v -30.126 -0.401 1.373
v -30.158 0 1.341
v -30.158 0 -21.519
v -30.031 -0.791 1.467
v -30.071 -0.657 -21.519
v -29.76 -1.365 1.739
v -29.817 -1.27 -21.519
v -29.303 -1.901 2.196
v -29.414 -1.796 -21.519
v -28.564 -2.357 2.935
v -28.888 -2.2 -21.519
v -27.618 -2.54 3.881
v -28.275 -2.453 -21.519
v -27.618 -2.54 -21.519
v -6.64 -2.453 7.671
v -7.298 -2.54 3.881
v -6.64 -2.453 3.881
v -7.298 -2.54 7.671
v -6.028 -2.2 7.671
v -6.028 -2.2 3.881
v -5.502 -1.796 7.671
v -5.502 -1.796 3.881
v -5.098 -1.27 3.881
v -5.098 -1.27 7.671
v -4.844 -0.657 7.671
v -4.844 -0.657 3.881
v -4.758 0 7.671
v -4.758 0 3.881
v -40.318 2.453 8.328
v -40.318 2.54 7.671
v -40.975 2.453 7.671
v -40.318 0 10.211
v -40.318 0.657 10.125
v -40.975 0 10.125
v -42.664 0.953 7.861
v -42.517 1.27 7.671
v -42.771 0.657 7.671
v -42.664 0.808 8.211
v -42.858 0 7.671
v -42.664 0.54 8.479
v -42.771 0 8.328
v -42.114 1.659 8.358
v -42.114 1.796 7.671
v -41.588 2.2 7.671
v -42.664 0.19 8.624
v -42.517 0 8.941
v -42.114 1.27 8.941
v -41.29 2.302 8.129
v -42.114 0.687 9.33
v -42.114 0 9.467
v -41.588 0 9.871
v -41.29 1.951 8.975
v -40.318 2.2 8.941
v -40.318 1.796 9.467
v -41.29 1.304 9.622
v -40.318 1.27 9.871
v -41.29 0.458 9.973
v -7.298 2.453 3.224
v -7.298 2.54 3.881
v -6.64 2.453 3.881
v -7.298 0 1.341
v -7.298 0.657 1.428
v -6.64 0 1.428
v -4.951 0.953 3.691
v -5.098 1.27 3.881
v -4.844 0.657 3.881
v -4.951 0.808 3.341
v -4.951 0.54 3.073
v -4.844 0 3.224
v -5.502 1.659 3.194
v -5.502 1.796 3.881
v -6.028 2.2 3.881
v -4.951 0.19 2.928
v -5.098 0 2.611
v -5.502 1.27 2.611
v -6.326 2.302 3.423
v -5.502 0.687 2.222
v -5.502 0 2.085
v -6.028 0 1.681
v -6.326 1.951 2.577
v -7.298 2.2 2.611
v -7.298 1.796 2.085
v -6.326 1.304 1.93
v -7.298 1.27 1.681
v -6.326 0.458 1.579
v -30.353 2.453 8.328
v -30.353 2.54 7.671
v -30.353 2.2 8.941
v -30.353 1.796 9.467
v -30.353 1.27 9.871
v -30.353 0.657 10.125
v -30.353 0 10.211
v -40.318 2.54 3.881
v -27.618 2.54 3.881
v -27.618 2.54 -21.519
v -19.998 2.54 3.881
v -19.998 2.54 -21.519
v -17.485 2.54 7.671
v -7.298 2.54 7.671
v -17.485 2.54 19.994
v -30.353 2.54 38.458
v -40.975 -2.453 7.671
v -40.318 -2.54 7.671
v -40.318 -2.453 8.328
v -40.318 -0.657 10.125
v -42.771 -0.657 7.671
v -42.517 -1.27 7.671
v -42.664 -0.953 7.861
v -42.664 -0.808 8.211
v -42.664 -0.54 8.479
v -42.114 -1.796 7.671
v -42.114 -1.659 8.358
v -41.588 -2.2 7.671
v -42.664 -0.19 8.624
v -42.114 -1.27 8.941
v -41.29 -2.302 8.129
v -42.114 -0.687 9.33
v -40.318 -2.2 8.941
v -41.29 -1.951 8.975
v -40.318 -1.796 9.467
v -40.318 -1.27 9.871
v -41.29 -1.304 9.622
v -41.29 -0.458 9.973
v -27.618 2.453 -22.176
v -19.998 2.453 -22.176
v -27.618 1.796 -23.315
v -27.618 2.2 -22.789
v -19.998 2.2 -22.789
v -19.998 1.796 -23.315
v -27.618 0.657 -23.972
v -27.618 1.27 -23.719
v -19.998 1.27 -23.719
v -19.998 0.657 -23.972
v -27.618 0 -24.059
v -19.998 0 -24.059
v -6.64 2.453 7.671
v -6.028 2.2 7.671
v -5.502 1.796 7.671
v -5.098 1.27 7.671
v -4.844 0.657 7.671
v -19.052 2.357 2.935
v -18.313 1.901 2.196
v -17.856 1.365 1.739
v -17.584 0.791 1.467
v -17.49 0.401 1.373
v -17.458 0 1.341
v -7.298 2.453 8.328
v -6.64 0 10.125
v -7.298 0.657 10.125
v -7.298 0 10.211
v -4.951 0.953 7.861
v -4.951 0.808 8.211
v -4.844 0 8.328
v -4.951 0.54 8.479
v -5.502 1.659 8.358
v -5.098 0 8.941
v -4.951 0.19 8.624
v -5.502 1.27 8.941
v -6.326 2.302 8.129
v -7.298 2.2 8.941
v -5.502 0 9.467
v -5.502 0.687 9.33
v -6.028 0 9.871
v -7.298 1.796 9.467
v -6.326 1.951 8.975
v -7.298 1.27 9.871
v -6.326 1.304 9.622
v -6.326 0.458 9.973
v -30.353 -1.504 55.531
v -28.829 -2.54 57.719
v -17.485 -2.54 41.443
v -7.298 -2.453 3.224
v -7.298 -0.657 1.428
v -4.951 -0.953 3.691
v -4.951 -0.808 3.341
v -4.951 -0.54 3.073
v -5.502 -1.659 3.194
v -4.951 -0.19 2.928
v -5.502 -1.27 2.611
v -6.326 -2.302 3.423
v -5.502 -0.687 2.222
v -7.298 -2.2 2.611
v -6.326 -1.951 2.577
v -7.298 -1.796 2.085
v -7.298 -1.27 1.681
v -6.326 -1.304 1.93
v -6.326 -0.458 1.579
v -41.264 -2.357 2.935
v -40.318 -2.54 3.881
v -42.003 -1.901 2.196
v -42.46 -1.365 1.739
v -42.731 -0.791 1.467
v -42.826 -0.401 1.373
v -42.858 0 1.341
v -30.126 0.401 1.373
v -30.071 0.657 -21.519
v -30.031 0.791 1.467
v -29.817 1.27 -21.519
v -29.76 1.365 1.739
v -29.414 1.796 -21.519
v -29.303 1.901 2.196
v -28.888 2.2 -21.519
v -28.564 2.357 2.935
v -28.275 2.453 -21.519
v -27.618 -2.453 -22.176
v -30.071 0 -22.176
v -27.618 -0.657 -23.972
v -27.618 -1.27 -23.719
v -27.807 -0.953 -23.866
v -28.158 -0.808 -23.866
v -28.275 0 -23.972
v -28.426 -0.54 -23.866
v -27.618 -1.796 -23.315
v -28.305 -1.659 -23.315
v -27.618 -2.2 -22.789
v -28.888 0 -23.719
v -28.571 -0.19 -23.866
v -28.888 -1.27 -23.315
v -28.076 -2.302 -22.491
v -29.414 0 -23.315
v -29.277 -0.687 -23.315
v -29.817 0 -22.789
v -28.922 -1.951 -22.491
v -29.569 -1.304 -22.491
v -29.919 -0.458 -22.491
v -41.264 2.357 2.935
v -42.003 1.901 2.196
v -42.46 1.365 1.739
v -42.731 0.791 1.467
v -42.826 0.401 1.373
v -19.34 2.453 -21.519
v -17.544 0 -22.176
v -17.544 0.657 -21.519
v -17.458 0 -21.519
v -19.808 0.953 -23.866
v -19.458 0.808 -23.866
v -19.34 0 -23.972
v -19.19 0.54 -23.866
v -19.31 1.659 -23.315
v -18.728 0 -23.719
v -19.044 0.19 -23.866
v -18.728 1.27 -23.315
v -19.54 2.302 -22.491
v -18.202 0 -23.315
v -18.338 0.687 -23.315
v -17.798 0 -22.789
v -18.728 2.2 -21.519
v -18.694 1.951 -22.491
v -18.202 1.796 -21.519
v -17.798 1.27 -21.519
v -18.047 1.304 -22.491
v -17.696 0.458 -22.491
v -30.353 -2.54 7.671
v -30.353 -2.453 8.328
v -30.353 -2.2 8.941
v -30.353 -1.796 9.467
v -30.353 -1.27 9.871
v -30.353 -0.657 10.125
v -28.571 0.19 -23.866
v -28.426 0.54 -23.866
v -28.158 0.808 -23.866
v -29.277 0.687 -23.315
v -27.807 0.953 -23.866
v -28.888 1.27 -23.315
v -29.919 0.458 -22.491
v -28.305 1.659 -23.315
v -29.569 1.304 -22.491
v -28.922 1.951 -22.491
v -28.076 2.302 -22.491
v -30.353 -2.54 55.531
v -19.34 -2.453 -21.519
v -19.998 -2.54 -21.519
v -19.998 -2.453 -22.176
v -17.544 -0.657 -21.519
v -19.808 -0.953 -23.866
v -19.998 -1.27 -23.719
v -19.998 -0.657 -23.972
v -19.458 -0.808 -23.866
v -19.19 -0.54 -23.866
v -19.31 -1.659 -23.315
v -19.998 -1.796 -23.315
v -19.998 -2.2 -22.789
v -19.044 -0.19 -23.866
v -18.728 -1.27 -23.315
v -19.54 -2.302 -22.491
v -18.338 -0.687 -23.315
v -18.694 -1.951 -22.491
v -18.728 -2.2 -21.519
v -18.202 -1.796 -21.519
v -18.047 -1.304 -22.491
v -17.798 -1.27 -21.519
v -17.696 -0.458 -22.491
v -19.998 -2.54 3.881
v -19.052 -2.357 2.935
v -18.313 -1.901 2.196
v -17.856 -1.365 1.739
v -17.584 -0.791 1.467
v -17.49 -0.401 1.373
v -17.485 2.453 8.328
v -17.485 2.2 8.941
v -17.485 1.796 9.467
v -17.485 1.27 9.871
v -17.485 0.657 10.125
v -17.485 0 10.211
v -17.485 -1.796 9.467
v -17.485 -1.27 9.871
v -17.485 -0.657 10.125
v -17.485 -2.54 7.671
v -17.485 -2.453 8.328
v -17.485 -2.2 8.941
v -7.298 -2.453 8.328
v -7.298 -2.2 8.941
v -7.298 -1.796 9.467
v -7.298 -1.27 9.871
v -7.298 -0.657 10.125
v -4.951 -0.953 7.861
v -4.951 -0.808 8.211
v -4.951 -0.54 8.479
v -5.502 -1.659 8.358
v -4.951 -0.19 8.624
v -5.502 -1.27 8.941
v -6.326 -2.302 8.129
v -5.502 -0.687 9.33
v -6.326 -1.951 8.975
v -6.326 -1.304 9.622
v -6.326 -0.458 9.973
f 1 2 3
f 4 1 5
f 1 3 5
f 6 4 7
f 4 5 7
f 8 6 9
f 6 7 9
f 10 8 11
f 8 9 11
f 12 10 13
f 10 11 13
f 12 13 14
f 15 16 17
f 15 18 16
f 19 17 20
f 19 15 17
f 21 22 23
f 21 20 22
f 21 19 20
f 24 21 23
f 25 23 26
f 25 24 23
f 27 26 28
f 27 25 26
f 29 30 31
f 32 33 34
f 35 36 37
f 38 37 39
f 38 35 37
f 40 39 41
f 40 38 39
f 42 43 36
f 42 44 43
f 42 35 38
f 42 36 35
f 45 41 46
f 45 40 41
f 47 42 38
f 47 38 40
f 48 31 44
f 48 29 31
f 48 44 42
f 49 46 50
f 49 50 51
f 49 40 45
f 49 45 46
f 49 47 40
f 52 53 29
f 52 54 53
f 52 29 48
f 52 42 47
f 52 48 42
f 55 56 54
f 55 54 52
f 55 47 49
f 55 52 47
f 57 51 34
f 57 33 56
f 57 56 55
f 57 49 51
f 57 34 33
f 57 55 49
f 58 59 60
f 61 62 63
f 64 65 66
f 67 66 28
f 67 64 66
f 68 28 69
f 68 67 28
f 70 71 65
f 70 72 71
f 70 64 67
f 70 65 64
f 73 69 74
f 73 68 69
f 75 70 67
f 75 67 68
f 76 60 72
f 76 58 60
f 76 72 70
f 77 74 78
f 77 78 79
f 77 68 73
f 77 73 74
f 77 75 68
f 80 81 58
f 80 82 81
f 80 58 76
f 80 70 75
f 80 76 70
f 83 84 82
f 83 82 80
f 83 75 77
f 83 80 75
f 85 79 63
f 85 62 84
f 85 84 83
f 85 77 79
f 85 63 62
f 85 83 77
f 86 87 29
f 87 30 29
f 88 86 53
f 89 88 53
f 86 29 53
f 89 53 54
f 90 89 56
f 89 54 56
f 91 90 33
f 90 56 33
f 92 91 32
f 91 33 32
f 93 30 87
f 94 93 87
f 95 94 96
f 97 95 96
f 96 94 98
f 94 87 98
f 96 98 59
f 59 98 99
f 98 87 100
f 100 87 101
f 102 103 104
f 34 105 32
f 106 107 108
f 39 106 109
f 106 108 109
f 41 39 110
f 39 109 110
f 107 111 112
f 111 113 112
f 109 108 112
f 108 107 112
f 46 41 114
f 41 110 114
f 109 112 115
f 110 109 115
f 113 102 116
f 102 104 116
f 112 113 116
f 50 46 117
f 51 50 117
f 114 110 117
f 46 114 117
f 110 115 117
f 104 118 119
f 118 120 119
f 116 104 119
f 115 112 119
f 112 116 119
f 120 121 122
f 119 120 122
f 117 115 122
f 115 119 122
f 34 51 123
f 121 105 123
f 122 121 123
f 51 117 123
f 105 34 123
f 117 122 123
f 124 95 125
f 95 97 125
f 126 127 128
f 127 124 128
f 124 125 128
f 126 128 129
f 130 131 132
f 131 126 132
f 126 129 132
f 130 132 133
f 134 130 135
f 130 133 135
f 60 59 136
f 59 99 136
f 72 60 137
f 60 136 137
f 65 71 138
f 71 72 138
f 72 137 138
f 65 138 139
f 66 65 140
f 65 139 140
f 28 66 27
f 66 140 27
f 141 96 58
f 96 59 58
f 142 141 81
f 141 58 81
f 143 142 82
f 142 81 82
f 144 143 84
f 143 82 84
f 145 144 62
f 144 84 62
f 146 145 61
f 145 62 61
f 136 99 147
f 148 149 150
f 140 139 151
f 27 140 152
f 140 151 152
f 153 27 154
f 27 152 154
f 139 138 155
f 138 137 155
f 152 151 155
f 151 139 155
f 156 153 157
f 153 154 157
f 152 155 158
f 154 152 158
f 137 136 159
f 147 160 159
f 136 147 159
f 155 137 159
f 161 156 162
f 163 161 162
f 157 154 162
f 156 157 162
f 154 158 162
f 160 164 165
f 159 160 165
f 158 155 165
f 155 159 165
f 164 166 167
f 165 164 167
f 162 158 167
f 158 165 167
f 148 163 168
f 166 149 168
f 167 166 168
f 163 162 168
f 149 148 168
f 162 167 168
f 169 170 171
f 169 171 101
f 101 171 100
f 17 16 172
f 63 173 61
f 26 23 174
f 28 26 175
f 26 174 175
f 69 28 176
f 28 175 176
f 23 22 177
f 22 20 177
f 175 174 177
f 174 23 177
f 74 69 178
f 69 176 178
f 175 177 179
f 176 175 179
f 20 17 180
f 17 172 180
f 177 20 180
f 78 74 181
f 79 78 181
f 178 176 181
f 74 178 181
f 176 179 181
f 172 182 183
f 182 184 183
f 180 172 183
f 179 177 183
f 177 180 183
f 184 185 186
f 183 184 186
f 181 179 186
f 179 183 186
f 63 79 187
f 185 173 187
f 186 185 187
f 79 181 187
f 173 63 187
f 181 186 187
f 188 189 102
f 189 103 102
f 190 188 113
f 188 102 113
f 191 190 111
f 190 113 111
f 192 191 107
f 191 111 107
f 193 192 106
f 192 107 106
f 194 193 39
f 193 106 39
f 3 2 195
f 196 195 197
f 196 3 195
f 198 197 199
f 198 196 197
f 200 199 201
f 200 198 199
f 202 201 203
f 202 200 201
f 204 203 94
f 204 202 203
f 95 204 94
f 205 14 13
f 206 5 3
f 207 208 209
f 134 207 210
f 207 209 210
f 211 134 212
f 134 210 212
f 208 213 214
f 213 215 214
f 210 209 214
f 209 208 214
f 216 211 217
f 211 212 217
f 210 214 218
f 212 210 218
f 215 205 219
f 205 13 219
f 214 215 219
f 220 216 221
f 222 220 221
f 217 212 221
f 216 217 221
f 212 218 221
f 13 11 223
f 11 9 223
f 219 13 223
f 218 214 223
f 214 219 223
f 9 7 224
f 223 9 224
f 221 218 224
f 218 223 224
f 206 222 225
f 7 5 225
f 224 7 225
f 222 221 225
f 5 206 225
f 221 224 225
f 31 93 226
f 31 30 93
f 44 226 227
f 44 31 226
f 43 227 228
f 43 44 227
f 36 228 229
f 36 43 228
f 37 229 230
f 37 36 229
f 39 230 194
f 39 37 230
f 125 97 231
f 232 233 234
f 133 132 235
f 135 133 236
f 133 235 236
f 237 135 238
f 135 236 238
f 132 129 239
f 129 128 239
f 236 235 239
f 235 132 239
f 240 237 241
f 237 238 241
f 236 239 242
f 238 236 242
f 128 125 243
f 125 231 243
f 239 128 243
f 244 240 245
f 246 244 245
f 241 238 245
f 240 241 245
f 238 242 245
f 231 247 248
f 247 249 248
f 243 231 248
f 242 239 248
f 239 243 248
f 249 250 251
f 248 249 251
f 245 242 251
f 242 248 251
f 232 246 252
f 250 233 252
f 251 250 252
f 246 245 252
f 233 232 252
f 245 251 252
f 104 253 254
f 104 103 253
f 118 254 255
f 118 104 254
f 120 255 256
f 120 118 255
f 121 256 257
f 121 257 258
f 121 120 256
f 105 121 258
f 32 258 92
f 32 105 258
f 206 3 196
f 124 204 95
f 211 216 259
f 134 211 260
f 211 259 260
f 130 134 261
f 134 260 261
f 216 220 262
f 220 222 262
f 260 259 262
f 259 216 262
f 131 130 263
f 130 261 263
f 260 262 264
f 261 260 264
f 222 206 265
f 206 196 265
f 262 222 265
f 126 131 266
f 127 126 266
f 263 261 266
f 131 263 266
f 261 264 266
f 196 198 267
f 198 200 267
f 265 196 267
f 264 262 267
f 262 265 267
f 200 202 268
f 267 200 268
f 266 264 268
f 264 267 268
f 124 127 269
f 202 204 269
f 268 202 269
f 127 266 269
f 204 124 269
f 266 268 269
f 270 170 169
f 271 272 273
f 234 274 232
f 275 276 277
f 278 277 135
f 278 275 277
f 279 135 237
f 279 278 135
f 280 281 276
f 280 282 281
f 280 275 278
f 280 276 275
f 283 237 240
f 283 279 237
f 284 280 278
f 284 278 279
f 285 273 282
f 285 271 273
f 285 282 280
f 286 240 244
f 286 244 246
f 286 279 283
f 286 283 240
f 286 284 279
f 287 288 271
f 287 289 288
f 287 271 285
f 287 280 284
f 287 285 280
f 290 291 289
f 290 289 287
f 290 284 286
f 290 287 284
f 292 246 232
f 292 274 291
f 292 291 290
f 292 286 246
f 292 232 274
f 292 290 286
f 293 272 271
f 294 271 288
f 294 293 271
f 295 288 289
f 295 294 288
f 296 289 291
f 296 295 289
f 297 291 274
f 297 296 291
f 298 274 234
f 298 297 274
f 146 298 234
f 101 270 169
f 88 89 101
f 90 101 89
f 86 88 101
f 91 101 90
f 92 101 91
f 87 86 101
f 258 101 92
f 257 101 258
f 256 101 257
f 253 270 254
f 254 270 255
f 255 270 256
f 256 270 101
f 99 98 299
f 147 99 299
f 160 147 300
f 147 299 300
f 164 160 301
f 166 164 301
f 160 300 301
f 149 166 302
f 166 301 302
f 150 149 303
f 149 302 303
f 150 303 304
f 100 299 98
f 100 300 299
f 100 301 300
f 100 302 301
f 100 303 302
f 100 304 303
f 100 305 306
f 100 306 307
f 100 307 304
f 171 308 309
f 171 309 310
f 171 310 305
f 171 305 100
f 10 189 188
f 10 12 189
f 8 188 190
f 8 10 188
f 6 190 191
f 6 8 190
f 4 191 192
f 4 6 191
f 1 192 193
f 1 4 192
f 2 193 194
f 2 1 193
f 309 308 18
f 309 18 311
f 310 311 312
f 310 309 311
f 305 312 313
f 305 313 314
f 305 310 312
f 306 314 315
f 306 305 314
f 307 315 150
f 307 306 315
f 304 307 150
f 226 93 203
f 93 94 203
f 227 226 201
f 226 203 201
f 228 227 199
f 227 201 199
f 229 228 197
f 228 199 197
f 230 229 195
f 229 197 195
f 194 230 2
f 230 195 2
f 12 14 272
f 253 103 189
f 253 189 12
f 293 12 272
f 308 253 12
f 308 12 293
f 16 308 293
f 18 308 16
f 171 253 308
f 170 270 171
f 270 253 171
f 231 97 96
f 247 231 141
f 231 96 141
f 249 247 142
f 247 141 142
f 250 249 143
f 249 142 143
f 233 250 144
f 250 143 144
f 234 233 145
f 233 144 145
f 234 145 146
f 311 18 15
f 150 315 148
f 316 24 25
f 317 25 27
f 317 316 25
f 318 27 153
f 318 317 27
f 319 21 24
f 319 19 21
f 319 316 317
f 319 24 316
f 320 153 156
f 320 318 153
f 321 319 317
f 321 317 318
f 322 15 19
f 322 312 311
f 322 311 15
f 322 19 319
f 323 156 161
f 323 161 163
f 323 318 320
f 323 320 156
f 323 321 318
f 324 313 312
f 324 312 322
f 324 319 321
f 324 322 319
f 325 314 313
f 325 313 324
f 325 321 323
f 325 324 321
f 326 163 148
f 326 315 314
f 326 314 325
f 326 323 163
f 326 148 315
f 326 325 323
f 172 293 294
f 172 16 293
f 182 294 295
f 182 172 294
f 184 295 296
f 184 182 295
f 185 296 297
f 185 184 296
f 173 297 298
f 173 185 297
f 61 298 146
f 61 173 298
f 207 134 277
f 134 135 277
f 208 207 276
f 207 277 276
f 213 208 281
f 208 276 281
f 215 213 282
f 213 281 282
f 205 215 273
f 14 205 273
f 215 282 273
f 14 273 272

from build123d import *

# Parameters (mm, degrees)
F0_W        = 12.7
F0_H        = 8.8700183392
F0_H_2      = 25.4
F2_DEPTH    = 2.54
F3_DEPTH    = 2.54
F4_R        = 2.53999
F5_T1_DEPTH = 76.5737284666
F6_T1_DEPTH = 62.0182579324


# Not quite as in the source:
# - a fillet or chamfer that OpenCascade refuses, or shapes differently, is made with other operations: its cross-section is extruded or revolved along the edge and cut away or added
# - a fillet or chamfer is up to 0.001 mm smaller than in the source, because OpenCascade refuses the exact size


with BuildPart() as f2:
    # F0 (on Front) → F2 (new body, symmetric)
    with BuildSketch(Plane.XZ):
        with Locations((-23.8077666163, 5.7760581046)):
            Rectangle(F0_W, F0_H)
        with Locations((-23.8077666163, -11.3589510649)):
            Rectangle(F0_W, F0_H_2)
        with Locations((-36.5077666163, 5.7760581046)):
            Rectangle(F0_W, F0_H)
        with Locations((-11.1077666163, 5.7760581046)):
            Rectangle(F0_W, F0_H)
    extrude(amount=F2_DEPTH, both=True)

    # F1 (on Front) → F3 (join, symmetric)
    with BuildSketch(Plane.XZ):
        Polygon((-30.3534455597, 10.2110672742), (-17.4847040325, 10.2110672742), (-17.4847040325, 55.5314160883), (-23.9190747961, 64.7633413825), (-30.3534455597, 55.5314160883), align=None)
    extrude(amount=F3_DEPTH, both=True)

    # F4 (radius 2.54 in the source; OpenCascade refuses exactly that, so slightly less here)
    f4_edges = [f2.edges().sort_by_distance(p)[0] for p in [
        (-11.107767, 2.54, 1.341049),
        (-11.107767, -2.54, 1.341049),
        (-11.121235, 2.54, 10.211067),
        (-11.121235, -2.54, 10.211067),
        (-4.757767, -2.54, 5.776058),
        (-4.757767, 2.54, 5.776058),
        (-4.757767, 0, 10.211067),
        (-4.757767, 0, 1.341049),
        (-36.605606, -2.54, 10.211067),
        (-36.605606, 2.54, 10.211067),
        (-36.507767, -2.54, 1.341049),
        (-36.507767, 2.54, 1.341049),
        (-42.857767, -2.54, 5.776058),
        (-42.857767, 2.54, 5.776058),
        (-42.857767, 0, 10.211067),
        (-17.457767, 2.54, -11.358951),
        (-17.457767, -2.54, -11.358951),
        (-30.157767, -2.54, -11.358951),
        (-30.157767, 2.54, -11.358951),
        (-23.807767, -2.54, -24.058951),
        (-30.157767, 0, -24.058951),
        (-23.807767, 2.54, -24.058951),
        (-17.457767, 0, -24.058951),
    ]]
    fillet(f4_edges, radius=F4_R)

    # F5: chamfer of 12.7 on 1 edges, made by hand

    # F5_s2 → F5_t1 (cut)
    with BuildSketch(Plane(origin=(-13.0912626788, 0, 18.7831201367), x_dir=(0, 1, 0), z_dir=(-0.5717925773, 0, 0.8203982256))):
        Polygon((2.54, -4.7080313623), (-10.16, -17.4080313623), (2.54, -17.4080313623), align=None)
    extrude(amount=F5_T1_DEPTH, mode=Mode.SUBTRACT)

    # F6: chamfer of 7.62 on 1 edges, made by hand

    # F6_s2 → F6_t1 (cut)
    with BuildSketch(Plane(origin=(-10.0507456007, 0, 14.4206381549), x_dir=(0, 1, 0), z_dir=(-0.5717925773, 0, 0.8203982256))):
        Polygon((-2.8481536726, -10.0961850349), (2.54, 2.9119686377), (2.54, -4.7080313623), align=None)
    extrude(amount=F6_T1_DEPTH, mode=Mode.SUBTRACT)


solid = f2.part
